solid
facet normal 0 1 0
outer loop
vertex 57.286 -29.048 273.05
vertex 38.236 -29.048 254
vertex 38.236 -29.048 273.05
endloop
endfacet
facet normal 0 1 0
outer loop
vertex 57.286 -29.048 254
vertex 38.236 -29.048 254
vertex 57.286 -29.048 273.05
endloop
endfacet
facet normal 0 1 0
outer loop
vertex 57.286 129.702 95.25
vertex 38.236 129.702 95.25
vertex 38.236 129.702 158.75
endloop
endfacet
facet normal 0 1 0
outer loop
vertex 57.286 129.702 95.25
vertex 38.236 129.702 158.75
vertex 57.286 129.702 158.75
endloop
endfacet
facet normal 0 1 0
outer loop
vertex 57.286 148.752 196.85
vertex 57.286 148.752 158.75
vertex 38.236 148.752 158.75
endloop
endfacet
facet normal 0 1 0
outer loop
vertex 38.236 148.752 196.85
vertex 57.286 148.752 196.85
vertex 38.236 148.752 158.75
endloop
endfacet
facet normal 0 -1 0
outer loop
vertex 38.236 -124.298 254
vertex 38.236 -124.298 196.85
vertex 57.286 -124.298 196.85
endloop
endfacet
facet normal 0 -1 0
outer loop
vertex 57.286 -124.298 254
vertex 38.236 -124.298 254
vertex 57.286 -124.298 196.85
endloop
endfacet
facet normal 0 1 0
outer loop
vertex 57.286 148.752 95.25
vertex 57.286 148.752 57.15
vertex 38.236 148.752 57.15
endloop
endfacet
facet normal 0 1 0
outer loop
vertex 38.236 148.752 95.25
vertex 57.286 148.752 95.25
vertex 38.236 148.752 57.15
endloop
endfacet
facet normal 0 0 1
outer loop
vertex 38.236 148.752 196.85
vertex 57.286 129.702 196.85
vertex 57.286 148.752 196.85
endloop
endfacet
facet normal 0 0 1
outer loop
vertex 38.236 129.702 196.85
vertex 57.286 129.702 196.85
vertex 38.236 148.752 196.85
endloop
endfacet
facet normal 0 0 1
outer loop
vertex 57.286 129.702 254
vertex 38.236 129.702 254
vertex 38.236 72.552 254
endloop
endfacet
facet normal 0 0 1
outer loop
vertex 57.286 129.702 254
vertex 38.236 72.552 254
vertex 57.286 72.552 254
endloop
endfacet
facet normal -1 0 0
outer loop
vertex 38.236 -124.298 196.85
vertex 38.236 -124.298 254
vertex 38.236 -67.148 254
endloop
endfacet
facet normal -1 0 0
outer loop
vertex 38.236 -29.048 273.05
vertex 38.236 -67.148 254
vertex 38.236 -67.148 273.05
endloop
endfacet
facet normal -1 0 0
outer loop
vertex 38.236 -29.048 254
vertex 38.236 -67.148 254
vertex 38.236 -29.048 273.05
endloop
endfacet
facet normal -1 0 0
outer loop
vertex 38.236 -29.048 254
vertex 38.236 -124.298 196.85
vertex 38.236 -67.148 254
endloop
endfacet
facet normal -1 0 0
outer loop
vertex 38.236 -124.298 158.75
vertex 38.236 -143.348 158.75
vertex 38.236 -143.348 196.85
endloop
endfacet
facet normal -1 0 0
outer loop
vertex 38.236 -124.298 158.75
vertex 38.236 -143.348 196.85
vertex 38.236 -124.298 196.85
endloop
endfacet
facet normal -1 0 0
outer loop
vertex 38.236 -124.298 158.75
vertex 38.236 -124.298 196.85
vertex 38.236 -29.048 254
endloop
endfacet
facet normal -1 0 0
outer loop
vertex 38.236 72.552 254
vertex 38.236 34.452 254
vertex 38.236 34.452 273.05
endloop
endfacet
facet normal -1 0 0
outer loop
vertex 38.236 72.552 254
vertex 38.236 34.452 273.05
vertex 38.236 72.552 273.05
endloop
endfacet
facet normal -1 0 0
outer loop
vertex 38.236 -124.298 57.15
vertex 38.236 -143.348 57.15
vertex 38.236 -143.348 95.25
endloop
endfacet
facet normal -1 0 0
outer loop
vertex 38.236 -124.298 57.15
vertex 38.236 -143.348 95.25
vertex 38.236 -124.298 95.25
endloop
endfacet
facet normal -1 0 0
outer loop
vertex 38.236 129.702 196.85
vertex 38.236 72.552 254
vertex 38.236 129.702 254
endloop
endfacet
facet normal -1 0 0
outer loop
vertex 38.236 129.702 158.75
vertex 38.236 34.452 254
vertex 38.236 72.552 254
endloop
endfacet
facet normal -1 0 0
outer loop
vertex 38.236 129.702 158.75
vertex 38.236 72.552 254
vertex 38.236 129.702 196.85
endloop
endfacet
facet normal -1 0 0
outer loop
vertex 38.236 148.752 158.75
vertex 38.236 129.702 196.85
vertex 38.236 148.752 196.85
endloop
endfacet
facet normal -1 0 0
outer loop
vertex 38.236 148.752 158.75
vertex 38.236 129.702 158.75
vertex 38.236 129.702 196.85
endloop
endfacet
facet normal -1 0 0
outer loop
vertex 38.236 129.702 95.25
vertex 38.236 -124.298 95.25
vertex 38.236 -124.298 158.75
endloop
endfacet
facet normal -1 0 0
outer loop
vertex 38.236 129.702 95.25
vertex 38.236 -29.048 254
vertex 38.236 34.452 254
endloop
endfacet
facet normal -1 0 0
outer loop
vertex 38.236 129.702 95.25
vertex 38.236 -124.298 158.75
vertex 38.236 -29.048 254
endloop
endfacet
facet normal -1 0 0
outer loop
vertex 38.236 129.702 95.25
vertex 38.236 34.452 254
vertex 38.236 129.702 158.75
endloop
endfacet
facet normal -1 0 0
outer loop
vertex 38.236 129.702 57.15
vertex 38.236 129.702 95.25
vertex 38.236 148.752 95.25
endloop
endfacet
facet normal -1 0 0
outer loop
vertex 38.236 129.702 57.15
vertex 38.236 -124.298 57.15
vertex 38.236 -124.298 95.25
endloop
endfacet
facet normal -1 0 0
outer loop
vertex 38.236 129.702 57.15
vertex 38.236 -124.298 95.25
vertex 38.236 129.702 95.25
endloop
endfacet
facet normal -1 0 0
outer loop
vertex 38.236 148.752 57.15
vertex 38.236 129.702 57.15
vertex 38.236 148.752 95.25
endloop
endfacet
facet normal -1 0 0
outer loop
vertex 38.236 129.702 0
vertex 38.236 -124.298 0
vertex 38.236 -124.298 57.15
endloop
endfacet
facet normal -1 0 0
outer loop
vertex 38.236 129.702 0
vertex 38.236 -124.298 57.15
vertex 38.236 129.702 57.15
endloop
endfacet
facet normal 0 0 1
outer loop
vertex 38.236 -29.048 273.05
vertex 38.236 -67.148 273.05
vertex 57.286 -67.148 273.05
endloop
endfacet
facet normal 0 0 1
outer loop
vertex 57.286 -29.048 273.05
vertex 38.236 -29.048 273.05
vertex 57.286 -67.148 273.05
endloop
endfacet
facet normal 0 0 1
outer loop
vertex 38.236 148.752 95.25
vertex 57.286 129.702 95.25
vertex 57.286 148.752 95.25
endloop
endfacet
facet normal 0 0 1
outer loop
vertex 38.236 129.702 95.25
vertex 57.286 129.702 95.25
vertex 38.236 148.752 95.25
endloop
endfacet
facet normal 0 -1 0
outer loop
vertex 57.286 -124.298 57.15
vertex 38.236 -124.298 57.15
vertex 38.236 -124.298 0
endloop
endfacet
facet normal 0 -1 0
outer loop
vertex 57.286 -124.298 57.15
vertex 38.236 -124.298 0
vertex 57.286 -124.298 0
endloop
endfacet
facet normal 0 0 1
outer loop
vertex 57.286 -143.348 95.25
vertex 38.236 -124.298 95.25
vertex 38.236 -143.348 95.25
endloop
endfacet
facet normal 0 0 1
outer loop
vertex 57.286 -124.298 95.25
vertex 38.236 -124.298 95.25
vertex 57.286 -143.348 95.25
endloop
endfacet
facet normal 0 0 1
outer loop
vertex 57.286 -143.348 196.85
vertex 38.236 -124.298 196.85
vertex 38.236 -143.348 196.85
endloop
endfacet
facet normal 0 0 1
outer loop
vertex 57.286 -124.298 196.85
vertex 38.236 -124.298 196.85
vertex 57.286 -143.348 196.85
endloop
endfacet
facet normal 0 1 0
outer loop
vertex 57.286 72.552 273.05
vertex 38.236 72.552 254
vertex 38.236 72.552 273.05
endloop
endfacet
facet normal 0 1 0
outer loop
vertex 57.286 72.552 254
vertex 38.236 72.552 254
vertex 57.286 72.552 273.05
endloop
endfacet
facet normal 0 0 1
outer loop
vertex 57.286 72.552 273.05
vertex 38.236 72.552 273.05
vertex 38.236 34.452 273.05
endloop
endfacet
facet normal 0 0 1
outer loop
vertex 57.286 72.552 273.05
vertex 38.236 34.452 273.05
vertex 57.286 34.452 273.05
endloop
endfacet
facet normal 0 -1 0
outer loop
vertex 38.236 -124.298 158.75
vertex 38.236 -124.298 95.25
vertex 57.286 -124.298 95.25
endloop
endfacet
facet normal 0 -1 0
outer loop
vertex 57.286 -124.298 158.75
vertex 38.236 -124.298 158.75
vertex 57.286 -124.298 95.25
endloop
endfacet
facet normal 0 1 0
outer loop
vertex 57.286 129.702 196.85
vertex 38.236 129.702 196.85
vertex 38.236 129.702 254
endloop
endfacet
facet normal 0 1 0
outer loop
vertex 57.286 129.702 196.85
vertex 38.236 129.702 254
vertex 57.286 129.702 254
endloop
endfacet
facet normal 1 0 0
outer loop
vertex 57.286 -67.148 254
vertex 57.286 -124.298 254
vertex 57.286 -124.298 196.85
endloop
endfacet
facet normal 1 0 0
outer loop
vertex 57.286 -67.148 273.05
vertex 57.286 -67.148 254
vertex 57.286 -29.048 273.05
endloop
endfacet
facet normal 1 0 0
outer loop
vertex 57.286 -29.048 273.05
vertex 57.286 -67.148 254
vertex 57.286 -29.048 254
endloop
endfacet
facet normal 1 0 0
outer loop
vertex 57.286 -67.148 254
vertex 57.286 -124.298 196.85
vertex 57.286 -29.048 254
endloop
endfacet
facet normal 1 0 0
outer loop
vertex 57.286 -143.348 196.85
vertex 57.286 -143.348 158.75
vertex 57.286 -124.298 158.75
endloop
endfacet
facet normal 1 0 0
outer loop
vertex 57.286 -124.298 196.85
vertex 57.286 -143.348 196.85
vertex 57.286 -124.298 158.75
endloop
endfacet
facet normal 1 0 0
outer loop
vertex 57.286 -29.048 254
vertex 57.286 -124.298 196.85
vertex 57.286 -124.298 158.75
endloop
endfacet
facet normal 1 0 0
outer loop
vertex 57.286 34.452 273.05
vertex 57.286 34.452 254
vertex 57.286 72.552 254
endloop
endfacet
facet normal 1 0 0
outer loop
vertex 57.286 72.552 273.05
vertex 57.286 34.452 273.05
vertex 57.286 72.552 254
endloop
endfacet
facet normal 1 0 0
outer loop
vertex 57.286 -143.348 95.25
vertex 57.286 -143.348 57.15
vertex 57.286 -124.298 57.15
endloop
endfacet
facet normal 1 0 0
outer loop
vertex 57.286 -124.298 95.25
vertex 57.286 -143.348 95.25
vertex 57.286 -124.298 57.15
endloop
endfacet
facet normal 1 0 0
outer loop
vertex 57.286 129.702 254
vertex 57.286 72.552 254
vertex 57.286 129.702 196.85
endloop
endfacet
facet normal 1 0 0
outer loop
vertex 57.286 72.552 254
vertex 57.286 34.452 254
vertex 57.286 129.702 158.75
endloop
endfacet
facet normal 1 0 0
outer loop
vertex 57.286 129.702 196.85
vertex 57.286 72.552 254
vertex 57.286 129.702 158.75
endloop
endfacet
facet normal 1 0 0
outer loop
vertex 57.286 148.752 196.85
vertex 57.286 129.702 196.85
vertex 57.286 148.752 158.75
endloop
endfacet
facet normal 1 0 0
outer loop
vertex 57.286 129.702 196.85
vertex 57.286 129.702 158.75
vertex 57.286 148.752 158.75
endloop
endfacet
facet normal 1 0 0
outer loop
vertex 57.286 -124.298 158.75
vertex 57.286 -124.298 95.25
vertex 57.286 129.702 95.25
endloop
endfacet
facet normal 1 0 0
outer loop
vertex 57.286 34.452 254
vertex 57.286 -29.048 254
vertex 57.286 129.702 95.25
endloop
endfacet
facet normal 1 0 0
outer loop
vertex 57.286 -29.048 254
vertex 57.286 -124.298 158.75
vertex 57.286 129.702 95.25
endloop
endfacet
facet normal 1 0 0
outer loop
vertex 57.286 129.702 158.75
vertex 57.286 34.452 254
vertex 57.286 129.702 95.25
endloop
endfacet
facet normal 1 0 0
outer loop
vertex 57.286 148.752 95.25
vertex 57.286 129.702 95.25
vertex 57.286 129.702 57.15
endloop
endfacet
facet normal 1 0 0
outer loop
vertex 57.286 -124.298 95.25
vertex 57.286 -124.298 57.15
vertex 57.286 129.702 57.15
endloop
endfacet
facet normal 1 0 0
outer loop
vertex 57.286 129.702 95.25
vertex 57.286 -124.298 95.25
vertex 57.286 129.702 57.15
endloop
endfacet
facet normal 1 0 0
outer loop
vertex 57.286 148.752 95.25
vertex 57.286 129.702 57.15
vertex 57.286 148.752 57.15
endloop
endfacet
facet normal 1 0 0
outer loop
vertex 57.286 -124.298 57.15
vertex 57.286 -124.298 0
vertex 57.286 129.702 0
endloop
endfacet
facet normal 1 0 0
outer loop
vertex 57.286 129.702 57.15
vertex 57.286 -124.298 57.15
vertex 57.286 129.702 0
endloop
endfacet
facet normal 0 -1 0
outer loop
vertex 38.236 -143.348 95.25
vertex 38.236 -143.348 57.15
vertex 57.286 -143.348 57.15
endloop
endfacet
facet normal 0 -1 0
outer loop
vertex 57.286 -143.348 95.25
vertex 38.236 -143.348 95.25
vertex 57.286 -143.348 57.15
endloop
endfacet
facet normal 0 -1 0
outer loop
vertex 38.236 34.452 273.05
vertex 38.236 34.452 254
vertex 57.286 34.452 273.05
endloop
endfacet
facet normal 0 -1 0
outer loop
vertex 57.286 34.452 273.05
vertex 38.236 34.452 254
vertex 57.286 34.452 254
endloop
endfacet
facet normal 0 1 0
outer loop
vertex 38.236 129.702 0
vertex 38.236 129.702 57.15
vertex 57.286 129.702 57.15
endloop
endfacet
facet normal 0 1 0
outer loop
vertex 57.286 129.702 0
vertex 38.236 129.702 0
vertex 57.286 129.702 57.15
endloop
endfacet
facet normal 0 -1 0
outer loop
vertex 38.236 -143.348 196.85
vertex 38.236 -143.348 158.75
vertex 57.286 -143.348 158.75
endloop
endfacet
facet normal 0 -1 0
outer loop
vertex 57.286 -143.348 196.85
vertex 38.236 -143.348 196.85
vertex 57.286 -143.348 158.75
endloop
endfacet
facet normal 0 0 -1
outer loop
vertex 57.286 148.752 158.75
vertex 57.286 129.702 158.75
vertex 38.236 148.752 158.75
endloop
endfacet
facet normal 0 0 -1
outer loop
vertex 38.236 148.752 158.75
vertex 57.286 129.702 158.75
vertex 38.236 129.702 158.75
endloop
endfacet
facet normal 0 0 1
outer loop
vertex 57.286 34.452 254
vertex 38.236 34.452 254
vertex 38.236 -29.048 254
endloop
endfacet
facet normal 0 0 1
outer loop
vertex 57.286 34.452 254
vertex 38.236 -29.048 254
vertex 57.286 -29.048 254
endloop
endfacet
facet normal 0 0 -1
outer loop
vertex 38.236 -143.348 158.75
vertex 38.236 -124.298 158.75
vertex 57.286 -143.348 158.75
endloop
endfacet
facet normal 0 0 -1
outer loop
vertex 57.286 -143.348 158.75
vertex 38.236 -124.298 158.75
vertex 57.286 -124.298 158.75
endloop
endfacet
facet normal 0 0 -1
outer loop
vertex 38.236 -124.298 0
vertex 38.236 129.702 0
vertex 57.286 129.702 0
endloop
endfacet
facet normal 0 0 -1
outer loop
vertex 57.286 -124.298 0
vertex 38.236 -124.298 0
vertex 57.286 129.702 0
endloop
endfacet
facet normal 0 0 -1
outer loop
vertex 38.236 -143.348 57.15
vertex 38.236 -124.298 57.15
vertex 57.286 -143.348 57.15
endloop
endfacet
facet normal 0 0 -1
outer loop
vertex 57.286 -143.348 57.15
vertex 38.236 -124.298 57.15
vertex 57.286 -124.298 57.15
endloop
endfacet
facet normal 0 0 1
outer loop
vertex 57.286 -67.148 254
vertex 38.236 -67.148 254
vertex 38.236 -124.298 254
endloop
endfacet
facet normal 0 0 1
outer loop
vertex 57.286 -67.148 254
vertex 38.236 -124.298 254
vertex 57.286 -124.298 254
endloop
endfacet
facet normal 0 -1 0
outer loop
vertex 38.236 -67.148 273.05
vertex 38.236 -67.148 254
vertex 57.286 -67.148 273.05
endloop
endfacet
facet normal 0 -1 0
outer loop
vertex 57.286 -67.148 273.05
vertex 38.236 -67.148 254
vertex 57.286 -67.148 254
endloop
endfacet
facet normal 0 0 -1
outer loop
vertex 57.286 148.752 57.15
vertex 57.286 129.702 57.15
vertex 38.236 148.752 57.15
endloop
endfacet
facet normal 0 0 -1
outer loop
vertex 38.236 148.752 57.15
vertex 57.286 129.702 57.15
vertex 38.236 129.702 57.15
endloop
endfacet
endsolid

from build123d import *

# Parameters (mm, degrees)
F0_W     = 19.05
F0_H     = 254
F1_DEPTH = 254
F2_W     = 19.05
F2_H     = 38.1
F3_DEPTH = 19.05
F4_W     = 19.05
F4_H     = 38.1
F5_DEPTH = 19.05
F6_W     = 19.05
F6_H     = 38.1
F7_DEPTH = 19.05


with BuildPart() as f1:
    # F0 (on Top) → F1 (new body)
    with BuildSketch(Plane.XY):
        with Locations((47.761202, 2.701772)):
            Rectangle(F0_W, F0_H)
    extrude(amount=F1_DEPTH)

    # F2 (on face) → F3 (join)
    with BuildSketch(Plane.XZ.offset(124.298228)):
        with Locations((47.761202, 76.2)):
            Rectangle(F2_W, F2_H)
        with Locations((47.761202, 177.8)):
            Rectangle(F2_W, F2_H)
    extrude(amount=F3_DEPTH)

    # F4 (on face) → F5 (join)
    with BuildSketch(Plane.XY.offset(254)):
        with Locations((47.761202, 53.501772)):
            Rectangle(F4_W, F4_H)
        with Locations((47.761202, -48.098228)):
            Rectangle(F4_W, F4_H)
    extrude(amount=F5_DEPTH)

    # F6 (on face) → F7 (join)
    with BuildSketch(Plane(origin=(0, 129.701772, 0), x_dir=(-1, 0, 0), z_dir=(0, 1, 0))):
        with Locations((-47.761202, 76.2)):
            Rectangle(F6_W, F6_H)
        with Locations((-47.761202, 177.8)):
            Rectangle(F6_W, F6_H)
    extrude(amount=F7_DEPTH)


solid = f1.part
